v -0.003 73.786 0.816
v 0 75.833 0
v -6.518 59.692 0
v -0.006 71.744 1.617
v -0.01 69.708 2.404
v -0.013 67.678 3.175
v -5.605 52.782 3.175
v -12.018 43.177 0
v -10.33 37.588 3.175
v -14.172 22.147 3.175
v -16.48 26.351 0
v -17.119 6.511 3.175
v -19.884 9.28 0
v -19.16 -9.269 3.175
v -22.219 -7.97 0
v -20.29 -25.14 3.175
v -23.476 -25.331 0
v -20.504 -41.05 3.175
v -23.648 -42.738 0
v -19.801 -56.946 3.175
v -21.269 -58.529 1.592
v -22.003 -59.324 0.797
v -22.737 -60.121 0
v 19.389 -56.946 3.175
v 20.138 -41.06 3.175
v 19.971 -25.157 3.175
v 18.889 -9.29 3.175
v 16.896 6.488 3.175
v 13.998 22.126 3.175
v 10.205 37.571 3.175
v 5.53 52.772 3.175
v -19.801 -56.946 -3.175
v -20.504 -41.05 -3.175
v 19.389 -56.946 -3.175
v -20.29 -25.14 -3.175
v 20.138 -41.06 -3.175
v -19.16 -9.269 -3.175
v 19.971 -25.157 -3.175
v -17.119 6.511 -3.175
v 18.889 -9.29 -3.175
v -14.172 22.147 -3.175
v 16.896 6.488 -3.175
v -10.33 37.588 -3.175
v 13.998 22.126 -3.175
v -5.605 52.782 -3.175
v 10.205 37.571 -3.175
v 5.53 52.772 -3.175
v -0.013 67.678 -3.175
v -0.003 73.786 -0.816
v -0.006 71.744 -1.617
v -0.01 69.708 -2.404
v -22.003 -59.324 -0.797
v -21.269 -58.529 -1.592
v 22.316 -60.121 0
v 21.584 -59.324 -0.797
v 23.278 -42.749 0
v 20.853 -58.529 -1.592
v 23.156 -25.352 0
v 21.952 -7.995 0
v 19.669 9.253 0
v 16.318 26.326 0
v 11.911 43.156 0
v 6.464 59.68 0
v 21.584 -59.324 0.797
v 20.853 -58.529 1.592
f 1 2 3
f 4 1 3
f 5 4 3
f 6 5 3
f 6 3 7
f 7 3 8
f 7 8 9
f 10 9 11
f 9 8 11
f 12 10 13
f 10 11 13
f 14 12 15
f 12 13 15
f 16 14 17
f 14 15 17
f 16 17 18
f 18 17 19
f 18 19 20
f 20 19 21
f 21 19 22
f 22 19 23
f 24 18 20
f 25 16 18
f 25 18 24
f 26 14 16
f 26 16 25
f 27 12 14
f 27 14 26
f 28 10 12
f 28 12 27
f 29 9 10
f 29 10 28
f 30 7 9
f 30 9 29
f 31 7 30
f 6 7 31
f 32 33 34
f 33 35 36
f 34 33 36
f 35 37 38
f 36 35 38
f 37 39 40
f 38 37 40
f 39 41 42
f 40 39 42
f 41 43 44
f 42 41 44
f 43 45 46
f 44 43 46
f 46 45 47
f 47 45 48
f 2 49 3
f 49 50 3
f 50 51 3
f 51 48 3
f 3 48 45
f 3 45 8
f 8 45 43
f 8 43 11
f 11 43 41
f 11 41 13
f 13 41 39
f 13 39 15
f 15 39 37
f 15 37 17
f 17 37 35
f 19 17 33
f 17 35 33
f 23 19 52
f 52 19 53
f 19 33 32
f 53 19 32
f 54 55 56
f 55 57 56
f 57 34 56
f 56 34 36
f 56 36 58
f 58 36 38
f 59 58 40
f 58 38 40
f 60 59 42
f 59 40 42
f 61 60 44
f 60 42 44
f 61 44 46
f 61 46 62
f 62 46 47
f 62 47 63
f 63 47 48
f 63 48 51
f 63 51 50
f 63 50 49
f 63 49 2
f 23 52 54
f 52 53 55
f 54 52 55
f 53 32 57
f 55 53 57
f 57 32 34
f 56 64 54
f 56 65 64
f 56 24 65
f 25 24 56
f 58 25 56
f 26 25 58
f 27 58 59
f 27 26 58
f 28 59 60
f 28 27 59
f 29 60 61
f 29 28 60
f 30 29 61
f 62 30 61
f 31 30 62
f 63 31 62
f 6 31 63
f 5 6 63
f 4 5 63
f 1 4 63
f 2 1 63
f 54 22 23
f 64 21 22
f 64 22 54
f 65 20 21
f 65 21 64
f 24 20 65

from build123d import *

# Parameters (mm, degrees)
F1_DEPTH = 3.175
F2_SIZE  = 3.17499


# Not quite as in the source:
# - a fillet or chamfer is up to 0.001 mm smaller than in the source, because OpenCascade refuses the exact size


with BuildPart() as f1:
    # F0 (on Top) → F1 (new body, symmetric)
    with BuildSketch(Plane.XY):
        with BuildLine():
            ThreePointArc((22.3162673387, -60.1211733557), (19.6694953196, 9.2531133838), (0, 75.8332006216))
            ThreePointArc((0, 75.8332006216), (-19.8842446441, 9.2801862209), (-22.7369976658, -60.1211733557))
            Line((-22.7369976658, -60.1211733557), (22.3162673387, -60.1211733557))
        make_face()
    extrude(amount=F1_DEPTH, both=True)

    # F2 (size 3.175 in the source; OpenCascade refuses exactly that, so slightly less here)
    f2_edges = [f1.edges().sort_by_distance(p)[0] for p in [
        (-0.210365, -60.121173, 3.175),
        (19.669495, 9.253113, 3.175),
        (-19.884245, 9.280186, 3.175),
        (-0.210365, -60.121173, -3.175),
        (19.669495, 9.253113, -3.175),
        (-19.884245, 9.280186, -3.175),
    ]]
    chamfer(f2_edges, length=F2_SIZE)


solid = f1.part
